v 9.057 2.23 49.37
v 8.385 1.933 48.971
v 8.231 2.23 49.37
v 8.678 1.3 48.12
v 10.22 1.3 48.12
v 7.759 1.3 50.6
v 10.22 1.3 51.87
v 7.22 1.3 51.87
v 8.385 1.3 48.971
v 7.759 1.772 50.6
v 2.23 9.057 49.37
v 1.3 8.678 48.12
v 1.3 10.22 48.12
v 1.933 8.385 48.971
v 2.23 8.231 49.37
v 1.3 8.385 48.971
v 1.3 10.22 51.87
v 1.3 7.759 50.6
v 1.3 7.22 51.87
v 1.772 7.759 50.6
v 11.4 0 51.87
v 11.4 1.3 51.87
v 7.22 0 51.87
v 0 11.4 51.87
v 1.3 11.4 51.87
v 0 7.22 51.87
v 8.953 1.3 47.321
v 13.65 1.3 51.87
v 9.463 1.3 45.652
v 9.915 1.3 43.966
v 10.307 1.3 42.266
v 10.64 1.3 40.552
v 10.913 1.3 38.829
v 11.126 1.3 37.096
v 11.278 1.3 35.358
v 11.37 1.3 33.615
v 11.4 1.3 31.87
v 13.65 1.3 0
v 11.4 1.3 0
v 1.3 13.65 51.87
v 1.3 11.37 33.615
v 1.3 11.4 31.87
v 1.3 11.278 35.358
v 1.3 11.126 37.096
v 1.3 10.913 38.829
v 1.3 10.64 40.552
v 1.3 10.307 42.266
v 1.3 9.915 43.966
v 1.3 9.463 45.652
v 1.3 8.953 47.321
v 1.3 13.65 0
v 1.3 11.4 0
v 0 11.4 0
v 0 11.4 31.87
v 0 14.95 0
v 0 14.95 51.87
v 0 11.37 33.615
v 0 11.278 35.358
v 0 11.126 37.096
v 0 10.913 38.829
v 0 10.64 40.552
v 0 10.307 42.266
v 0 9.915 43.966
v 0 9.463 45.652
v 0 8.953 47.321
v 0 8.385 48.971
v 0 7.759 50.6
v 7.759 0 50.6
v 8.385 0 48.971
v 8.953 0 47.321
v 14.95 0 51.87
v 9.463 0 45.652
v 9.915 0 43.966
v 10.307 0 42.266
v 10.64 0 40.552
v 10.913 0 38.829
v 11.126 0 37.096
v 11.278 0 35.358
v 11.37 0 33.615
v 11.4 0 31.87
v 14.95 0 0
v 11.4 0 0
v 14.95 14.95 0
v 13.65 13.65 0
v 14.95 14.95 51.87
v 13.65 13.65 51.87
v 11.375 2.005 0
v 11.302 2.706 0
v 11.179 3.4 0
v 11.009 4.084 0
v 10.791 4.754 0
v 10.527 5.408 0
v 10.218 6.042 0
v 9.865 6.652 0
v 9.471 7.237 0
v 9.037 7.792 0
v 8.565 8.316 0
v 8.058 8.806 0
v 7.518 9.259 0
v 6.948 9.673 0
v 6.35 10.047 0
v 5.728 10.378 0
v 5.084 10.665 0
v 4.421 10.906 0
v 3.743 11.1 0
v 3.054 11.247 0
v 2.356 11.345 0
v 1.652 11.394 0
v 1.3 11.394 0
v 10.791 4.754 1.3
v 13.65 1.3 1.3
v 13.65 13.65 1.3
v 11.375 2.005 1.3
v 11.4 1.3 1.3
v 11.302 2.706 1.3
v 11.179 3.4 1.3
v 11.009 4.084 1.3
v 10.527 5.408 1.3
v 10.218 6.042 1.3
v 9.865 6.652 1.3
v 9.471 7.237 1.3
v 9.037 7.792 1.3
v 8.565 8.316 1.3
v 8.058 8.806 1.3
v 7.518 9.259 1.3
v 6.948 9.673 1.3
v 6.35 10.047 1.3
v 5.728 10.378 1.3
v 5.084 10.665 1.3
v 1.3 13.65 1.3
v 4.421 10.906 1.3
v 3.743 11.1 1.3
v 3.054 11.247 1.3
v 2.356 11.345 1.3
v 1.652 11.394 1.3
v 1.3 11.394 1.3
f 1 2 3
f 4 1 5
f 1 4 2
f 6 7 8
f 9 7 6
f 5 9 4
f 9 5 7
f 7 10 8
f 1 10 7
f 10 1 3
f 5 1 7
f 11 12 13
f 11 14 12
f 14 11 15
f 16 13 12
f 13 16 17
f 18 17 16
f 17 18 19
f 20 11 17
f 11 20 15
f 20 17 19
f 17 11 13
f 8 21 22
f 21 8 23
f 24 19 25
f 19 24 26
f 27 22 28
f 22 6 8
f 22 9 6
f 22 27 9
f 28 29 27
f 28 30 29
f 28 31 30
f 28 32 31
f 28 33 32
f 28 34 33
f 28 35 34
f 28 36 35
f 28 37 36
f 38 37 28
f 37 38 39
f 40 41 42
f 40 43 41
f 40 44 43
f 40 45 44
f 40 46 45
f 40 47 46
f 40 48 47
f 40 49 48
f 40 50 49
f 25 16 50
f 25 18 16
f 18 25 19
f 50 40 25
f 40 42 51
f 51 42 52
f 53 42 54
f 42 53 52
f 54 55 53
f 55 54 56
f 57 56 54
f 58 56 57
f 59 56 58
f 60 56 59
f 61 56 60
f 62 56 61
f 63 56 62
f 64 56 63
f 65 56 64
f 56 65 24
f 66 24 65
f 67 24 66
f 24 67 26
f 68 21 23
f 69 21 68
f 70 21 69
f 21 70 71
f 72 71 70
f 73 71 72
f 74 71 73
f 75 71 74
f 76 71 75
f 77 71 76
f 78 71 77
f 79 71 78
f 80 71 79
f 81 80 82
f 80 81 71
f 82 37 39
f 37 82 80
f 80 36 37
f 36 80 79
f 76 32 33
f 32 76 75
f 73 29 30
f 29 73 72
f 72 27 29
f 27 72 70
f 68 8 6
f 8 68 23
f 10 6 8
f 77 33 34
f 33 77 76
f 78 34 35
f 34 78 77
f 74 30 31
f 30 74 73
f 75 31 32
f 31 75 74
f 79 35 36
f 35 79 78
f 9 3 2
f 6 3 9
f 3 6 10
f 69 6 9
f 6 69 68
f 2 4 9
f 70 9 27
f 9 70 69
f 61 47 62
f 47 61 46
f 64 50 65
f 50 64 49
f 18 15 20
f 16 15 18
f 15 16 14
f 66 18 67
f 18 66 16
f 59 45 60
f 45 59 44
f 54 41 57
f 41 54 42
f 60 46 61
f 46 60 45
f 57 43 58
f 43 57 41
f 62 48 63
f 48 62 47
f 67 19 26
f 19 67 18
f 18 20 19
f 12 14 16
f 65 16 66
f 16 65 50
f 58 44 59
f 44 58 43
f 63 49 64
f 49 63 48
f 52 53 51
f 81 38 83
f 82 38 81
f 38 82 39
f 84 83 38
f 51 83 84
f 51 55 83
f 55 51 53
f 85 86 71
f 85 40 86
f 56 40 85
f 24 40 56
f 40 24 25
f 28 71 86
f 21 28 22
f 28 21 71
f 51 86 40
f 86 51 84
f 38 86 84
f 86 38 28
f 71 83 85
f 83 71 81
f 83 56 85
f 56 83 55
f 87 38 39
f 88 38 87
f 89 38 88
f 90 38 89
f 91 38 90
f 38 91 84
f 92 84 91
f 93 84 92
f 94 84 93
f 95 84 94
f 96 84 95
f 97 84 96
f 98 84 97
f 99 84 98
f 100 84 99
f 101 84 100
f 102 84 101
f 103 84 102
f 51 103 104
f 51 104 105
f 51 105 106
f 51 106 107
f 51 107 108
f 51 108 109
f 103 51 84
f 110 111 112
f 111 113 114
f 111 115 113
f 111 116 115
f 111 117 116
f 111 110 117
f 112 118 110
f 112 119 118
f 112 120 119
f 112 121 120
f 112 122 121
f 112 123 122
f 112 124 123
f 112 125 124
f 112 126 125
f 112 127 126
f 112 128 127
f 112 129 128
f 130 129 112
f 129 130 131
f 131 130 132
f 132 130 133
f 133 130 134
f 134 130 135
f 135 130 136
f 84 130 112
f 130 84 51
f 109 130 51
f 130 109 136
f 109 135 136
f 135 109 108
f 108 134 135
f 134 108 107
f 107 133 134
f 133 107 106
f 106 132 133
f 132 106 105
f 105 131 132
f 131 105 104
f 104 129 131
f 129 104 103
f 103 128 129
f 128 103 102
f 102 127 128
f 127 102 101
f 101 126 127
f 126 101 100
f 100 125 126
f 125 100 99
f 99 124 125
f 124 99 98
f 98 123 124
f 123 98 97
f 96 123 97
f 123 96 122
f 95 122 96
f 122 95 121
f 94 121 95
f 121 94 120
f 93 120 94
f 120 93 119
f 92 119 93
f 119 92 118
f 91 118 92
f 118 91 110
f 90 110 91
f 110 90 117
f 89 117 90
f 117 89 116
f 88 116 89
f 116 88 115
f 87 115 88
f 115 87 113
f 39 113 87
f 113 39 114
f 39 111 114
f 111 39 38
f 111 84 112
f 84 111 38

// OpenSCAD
/*
A small part which securely stores and conveniently dispenses 6-sided dice.

Default configuration holds 6 Chessex 12mm dice, but the design is parameterized to
easily allow for other amounts of dice, or to use different dice sizes or tolerances with
a little more effort.
*/

/*[Dice Propertes]*/
// Number of dice
num_dice = 4;
// Width of each die, with tolerance
die_width = 12.35;
// Height of each die, with tolerance
die_height = 11.93;

/*[Model Properties]*/
// Thickness of body walls
wall_thick = 1.3;

module end_customizer() {}

// Width of the walls that hold the dice in
retainer_width = 2.25;

// Size of the detent "bump" holding the dice in
detent_height = 3.75;
detent_middle = 1.25;
detent_depth = 0.93;
detent_width = 3;

// Size of the slots either side of the detent
cutout_width = 0.5;
cutout_height = 8;
cutout_radius = 40;
cutout_angle = 16; // Portion of circle to use for cutouts, in degrees

// Space above the top of the last die; used to align the detent
ramp_height = 2.85;

// Total height and radius to use for "lips" that constrict toward the opening
lip_radius = 50;
lip_height = 20;

// Tolerance value to avoid floating point errors in render
epsil = 0.001;


module body() {
    linear_extrude(wall_thick + num_dice * die_height + ramp_height) {
        difference() {
            square(die_width + 2*wall_thick);
            translate([wall_thick, wall_thick]) {
                square(die_width);
            }
            square(die_width + wall_thick - retainer_width);
        }
    }
}

module cap() {
    linear_extrude(wall_thick) {
        translate([wall_thick, wall_thick]) {
            difference() {
                square(die_width);
                circle(die_width - retainer_width, $fn=90);
            }
        }
    }
}

module detent() {
  intersection() {
    // This gets rotated into -x,-y...
    rotate(-90, [0,0,1]) {
        rotate(90, [1,0,0]) {
            linear_extrude(detent_width) {
                polygon([
                    [0,0],
                    [detent_depth,detent_middle],
                    [0,detent_height]
                ]);
            }
        }
    }
    linear_extrude(detent_height) {
      polygon([
        [0,0],
        [-detent_width,0],
        [-(detent_width-detent_depth*1.25),-detent_depth],
        [0,-detent_depth]
      ]);
    }
  }
}

module pos_detent() {
  translate([wall_thick+die_width-6.43,wall_thick,lip_height-detent_height]) {
    rotate(180, [0,0,1]) detent();
  }
}


module lips_cyl() {
    translate([0, -epsil, 0]) {
        rotate(-90, [1,0,0]) {
            linear_extrude(wall_thick + detent_depth + 2*epsil) {
                translate([-lip_radius + die_width + wall_thick - retainer_width, 0, 0]) {
                    circle(lip_radius, $fn=180);
                }
            }
        }
    }
}

module lips() {
    difference() {
      union() {
        linear_extrude(lip_height) {
            difference() {
                square(wall_thick + die_width - retainer_width);
                translate([wall_thick, wall_thick]) {
                    square(die_width);
                }
            }
        }
        pos_detent();
        mirror([1,-1,0]) pos_detent();
      }
      lips_cyl();
      mirror([1,-1,0]) lips_cyl();
    }
}

module cutouts() {
    translate([0,0,-cutout_height-ramp_height]) {
        cube([cutout_width, wall_thick + 2*epsil, cutout_height + ramp_height]);
        translate([cutout_width + detent_width, 0, 0]) {
            cube([cutout_width, wall_thick + 2*epsil, cutout_height + ramp_height]);
        }
    }
}

module round_cutouts() {
    rotate(-90, [1,0,0]) {
        linear_extrude(wall_thick + 2*epsil) {
            translate([-cutout_radius+cutout_width, 0]) {
                intersection() {
                    difference() {
                        circle(cutout_radius, $fn=90);
                        circle(cutout_radius-cutout_width, $fn=90);
                    }
                    polygon([
                        [0,0],
                        [999*cos(cutout_angle),999*sin(cutout_angle)],
                        [999,0]
                    ]);
                }
            }
            translate([cutout_radius+detent_width+cutout_width, 0]) {
                intersection() {
                    difference() {
                        circle(cutout_radius, $fn=90);
                        circle(cutout_radius-cutout_width, $fn=90);
                    }
                    polygon([
                        [0,0],
                        [-999*cos(cutout_angle),999*sin(cutout_angle)],
                        [-999,0]
                    ]);
                }
            }
        }
    }
}

module decoration() {
  deco_depth = wall_thick/2;
  translate([die_width+2*wall_thick,0,0]) {
    translate([-deco_depth+epsil,die_width+2*wall_thick,0]) {
      rotate(180,zaxis) rotate(-90,yaxis) {
        linear_extrude(deco_depth) {
          intersection() {
            square([wall_thick+num_dice*die_height+ramp_height,die_width+2*wall_thick],false);
            translate([10,4.4]) text("magic",9,"Comic Sans MS");
          }
        }
      }
    }
  }
}

module holder() {
    // Align and put together all the bits
    difference() {
        union() {
            body();
            cap();
            translate([
                (wall_thick*2 + die_width + detent_width)/2,
                wall_thick + die_width,
                wall_thick + num_dice*die_height + ramp_height - detent_height
            ]) {
                // detent();
            }
            translate([0, 0, wall_thick + num_dice*die_height + ramp_height - lip_height]) {
                lips();
            }
        }
        translate([
            wall_thick + (die_width - detent_width)/2 - cutout_width,
            wall_thick + die_width - epsil,
            wall_thick + die_height*num_dice + ramp_height + epsil
        ]) {
          union() {
            //cutouts();
            //round_cutouts();
          }
        }
        *decoration();
    }
}

module on_axis_holder() {
    translate([-1.5*wall_thick - die_width, -1.5*wall_thick - die_width, 0]) {
        holder();
    }
}

module triholder() {
    on_axis_holder();
    rotate(120, [0,0,1]) {
        on_axis_holder();
    }
    rotate(-120, [0,0,1]) {
        on_axis_holder();
    } 
}

render(convexity=8) {
  holder();
}

xaxis=[1,0,0];
yaxis=[0,1,0];
zaxis=[0,0,1];
